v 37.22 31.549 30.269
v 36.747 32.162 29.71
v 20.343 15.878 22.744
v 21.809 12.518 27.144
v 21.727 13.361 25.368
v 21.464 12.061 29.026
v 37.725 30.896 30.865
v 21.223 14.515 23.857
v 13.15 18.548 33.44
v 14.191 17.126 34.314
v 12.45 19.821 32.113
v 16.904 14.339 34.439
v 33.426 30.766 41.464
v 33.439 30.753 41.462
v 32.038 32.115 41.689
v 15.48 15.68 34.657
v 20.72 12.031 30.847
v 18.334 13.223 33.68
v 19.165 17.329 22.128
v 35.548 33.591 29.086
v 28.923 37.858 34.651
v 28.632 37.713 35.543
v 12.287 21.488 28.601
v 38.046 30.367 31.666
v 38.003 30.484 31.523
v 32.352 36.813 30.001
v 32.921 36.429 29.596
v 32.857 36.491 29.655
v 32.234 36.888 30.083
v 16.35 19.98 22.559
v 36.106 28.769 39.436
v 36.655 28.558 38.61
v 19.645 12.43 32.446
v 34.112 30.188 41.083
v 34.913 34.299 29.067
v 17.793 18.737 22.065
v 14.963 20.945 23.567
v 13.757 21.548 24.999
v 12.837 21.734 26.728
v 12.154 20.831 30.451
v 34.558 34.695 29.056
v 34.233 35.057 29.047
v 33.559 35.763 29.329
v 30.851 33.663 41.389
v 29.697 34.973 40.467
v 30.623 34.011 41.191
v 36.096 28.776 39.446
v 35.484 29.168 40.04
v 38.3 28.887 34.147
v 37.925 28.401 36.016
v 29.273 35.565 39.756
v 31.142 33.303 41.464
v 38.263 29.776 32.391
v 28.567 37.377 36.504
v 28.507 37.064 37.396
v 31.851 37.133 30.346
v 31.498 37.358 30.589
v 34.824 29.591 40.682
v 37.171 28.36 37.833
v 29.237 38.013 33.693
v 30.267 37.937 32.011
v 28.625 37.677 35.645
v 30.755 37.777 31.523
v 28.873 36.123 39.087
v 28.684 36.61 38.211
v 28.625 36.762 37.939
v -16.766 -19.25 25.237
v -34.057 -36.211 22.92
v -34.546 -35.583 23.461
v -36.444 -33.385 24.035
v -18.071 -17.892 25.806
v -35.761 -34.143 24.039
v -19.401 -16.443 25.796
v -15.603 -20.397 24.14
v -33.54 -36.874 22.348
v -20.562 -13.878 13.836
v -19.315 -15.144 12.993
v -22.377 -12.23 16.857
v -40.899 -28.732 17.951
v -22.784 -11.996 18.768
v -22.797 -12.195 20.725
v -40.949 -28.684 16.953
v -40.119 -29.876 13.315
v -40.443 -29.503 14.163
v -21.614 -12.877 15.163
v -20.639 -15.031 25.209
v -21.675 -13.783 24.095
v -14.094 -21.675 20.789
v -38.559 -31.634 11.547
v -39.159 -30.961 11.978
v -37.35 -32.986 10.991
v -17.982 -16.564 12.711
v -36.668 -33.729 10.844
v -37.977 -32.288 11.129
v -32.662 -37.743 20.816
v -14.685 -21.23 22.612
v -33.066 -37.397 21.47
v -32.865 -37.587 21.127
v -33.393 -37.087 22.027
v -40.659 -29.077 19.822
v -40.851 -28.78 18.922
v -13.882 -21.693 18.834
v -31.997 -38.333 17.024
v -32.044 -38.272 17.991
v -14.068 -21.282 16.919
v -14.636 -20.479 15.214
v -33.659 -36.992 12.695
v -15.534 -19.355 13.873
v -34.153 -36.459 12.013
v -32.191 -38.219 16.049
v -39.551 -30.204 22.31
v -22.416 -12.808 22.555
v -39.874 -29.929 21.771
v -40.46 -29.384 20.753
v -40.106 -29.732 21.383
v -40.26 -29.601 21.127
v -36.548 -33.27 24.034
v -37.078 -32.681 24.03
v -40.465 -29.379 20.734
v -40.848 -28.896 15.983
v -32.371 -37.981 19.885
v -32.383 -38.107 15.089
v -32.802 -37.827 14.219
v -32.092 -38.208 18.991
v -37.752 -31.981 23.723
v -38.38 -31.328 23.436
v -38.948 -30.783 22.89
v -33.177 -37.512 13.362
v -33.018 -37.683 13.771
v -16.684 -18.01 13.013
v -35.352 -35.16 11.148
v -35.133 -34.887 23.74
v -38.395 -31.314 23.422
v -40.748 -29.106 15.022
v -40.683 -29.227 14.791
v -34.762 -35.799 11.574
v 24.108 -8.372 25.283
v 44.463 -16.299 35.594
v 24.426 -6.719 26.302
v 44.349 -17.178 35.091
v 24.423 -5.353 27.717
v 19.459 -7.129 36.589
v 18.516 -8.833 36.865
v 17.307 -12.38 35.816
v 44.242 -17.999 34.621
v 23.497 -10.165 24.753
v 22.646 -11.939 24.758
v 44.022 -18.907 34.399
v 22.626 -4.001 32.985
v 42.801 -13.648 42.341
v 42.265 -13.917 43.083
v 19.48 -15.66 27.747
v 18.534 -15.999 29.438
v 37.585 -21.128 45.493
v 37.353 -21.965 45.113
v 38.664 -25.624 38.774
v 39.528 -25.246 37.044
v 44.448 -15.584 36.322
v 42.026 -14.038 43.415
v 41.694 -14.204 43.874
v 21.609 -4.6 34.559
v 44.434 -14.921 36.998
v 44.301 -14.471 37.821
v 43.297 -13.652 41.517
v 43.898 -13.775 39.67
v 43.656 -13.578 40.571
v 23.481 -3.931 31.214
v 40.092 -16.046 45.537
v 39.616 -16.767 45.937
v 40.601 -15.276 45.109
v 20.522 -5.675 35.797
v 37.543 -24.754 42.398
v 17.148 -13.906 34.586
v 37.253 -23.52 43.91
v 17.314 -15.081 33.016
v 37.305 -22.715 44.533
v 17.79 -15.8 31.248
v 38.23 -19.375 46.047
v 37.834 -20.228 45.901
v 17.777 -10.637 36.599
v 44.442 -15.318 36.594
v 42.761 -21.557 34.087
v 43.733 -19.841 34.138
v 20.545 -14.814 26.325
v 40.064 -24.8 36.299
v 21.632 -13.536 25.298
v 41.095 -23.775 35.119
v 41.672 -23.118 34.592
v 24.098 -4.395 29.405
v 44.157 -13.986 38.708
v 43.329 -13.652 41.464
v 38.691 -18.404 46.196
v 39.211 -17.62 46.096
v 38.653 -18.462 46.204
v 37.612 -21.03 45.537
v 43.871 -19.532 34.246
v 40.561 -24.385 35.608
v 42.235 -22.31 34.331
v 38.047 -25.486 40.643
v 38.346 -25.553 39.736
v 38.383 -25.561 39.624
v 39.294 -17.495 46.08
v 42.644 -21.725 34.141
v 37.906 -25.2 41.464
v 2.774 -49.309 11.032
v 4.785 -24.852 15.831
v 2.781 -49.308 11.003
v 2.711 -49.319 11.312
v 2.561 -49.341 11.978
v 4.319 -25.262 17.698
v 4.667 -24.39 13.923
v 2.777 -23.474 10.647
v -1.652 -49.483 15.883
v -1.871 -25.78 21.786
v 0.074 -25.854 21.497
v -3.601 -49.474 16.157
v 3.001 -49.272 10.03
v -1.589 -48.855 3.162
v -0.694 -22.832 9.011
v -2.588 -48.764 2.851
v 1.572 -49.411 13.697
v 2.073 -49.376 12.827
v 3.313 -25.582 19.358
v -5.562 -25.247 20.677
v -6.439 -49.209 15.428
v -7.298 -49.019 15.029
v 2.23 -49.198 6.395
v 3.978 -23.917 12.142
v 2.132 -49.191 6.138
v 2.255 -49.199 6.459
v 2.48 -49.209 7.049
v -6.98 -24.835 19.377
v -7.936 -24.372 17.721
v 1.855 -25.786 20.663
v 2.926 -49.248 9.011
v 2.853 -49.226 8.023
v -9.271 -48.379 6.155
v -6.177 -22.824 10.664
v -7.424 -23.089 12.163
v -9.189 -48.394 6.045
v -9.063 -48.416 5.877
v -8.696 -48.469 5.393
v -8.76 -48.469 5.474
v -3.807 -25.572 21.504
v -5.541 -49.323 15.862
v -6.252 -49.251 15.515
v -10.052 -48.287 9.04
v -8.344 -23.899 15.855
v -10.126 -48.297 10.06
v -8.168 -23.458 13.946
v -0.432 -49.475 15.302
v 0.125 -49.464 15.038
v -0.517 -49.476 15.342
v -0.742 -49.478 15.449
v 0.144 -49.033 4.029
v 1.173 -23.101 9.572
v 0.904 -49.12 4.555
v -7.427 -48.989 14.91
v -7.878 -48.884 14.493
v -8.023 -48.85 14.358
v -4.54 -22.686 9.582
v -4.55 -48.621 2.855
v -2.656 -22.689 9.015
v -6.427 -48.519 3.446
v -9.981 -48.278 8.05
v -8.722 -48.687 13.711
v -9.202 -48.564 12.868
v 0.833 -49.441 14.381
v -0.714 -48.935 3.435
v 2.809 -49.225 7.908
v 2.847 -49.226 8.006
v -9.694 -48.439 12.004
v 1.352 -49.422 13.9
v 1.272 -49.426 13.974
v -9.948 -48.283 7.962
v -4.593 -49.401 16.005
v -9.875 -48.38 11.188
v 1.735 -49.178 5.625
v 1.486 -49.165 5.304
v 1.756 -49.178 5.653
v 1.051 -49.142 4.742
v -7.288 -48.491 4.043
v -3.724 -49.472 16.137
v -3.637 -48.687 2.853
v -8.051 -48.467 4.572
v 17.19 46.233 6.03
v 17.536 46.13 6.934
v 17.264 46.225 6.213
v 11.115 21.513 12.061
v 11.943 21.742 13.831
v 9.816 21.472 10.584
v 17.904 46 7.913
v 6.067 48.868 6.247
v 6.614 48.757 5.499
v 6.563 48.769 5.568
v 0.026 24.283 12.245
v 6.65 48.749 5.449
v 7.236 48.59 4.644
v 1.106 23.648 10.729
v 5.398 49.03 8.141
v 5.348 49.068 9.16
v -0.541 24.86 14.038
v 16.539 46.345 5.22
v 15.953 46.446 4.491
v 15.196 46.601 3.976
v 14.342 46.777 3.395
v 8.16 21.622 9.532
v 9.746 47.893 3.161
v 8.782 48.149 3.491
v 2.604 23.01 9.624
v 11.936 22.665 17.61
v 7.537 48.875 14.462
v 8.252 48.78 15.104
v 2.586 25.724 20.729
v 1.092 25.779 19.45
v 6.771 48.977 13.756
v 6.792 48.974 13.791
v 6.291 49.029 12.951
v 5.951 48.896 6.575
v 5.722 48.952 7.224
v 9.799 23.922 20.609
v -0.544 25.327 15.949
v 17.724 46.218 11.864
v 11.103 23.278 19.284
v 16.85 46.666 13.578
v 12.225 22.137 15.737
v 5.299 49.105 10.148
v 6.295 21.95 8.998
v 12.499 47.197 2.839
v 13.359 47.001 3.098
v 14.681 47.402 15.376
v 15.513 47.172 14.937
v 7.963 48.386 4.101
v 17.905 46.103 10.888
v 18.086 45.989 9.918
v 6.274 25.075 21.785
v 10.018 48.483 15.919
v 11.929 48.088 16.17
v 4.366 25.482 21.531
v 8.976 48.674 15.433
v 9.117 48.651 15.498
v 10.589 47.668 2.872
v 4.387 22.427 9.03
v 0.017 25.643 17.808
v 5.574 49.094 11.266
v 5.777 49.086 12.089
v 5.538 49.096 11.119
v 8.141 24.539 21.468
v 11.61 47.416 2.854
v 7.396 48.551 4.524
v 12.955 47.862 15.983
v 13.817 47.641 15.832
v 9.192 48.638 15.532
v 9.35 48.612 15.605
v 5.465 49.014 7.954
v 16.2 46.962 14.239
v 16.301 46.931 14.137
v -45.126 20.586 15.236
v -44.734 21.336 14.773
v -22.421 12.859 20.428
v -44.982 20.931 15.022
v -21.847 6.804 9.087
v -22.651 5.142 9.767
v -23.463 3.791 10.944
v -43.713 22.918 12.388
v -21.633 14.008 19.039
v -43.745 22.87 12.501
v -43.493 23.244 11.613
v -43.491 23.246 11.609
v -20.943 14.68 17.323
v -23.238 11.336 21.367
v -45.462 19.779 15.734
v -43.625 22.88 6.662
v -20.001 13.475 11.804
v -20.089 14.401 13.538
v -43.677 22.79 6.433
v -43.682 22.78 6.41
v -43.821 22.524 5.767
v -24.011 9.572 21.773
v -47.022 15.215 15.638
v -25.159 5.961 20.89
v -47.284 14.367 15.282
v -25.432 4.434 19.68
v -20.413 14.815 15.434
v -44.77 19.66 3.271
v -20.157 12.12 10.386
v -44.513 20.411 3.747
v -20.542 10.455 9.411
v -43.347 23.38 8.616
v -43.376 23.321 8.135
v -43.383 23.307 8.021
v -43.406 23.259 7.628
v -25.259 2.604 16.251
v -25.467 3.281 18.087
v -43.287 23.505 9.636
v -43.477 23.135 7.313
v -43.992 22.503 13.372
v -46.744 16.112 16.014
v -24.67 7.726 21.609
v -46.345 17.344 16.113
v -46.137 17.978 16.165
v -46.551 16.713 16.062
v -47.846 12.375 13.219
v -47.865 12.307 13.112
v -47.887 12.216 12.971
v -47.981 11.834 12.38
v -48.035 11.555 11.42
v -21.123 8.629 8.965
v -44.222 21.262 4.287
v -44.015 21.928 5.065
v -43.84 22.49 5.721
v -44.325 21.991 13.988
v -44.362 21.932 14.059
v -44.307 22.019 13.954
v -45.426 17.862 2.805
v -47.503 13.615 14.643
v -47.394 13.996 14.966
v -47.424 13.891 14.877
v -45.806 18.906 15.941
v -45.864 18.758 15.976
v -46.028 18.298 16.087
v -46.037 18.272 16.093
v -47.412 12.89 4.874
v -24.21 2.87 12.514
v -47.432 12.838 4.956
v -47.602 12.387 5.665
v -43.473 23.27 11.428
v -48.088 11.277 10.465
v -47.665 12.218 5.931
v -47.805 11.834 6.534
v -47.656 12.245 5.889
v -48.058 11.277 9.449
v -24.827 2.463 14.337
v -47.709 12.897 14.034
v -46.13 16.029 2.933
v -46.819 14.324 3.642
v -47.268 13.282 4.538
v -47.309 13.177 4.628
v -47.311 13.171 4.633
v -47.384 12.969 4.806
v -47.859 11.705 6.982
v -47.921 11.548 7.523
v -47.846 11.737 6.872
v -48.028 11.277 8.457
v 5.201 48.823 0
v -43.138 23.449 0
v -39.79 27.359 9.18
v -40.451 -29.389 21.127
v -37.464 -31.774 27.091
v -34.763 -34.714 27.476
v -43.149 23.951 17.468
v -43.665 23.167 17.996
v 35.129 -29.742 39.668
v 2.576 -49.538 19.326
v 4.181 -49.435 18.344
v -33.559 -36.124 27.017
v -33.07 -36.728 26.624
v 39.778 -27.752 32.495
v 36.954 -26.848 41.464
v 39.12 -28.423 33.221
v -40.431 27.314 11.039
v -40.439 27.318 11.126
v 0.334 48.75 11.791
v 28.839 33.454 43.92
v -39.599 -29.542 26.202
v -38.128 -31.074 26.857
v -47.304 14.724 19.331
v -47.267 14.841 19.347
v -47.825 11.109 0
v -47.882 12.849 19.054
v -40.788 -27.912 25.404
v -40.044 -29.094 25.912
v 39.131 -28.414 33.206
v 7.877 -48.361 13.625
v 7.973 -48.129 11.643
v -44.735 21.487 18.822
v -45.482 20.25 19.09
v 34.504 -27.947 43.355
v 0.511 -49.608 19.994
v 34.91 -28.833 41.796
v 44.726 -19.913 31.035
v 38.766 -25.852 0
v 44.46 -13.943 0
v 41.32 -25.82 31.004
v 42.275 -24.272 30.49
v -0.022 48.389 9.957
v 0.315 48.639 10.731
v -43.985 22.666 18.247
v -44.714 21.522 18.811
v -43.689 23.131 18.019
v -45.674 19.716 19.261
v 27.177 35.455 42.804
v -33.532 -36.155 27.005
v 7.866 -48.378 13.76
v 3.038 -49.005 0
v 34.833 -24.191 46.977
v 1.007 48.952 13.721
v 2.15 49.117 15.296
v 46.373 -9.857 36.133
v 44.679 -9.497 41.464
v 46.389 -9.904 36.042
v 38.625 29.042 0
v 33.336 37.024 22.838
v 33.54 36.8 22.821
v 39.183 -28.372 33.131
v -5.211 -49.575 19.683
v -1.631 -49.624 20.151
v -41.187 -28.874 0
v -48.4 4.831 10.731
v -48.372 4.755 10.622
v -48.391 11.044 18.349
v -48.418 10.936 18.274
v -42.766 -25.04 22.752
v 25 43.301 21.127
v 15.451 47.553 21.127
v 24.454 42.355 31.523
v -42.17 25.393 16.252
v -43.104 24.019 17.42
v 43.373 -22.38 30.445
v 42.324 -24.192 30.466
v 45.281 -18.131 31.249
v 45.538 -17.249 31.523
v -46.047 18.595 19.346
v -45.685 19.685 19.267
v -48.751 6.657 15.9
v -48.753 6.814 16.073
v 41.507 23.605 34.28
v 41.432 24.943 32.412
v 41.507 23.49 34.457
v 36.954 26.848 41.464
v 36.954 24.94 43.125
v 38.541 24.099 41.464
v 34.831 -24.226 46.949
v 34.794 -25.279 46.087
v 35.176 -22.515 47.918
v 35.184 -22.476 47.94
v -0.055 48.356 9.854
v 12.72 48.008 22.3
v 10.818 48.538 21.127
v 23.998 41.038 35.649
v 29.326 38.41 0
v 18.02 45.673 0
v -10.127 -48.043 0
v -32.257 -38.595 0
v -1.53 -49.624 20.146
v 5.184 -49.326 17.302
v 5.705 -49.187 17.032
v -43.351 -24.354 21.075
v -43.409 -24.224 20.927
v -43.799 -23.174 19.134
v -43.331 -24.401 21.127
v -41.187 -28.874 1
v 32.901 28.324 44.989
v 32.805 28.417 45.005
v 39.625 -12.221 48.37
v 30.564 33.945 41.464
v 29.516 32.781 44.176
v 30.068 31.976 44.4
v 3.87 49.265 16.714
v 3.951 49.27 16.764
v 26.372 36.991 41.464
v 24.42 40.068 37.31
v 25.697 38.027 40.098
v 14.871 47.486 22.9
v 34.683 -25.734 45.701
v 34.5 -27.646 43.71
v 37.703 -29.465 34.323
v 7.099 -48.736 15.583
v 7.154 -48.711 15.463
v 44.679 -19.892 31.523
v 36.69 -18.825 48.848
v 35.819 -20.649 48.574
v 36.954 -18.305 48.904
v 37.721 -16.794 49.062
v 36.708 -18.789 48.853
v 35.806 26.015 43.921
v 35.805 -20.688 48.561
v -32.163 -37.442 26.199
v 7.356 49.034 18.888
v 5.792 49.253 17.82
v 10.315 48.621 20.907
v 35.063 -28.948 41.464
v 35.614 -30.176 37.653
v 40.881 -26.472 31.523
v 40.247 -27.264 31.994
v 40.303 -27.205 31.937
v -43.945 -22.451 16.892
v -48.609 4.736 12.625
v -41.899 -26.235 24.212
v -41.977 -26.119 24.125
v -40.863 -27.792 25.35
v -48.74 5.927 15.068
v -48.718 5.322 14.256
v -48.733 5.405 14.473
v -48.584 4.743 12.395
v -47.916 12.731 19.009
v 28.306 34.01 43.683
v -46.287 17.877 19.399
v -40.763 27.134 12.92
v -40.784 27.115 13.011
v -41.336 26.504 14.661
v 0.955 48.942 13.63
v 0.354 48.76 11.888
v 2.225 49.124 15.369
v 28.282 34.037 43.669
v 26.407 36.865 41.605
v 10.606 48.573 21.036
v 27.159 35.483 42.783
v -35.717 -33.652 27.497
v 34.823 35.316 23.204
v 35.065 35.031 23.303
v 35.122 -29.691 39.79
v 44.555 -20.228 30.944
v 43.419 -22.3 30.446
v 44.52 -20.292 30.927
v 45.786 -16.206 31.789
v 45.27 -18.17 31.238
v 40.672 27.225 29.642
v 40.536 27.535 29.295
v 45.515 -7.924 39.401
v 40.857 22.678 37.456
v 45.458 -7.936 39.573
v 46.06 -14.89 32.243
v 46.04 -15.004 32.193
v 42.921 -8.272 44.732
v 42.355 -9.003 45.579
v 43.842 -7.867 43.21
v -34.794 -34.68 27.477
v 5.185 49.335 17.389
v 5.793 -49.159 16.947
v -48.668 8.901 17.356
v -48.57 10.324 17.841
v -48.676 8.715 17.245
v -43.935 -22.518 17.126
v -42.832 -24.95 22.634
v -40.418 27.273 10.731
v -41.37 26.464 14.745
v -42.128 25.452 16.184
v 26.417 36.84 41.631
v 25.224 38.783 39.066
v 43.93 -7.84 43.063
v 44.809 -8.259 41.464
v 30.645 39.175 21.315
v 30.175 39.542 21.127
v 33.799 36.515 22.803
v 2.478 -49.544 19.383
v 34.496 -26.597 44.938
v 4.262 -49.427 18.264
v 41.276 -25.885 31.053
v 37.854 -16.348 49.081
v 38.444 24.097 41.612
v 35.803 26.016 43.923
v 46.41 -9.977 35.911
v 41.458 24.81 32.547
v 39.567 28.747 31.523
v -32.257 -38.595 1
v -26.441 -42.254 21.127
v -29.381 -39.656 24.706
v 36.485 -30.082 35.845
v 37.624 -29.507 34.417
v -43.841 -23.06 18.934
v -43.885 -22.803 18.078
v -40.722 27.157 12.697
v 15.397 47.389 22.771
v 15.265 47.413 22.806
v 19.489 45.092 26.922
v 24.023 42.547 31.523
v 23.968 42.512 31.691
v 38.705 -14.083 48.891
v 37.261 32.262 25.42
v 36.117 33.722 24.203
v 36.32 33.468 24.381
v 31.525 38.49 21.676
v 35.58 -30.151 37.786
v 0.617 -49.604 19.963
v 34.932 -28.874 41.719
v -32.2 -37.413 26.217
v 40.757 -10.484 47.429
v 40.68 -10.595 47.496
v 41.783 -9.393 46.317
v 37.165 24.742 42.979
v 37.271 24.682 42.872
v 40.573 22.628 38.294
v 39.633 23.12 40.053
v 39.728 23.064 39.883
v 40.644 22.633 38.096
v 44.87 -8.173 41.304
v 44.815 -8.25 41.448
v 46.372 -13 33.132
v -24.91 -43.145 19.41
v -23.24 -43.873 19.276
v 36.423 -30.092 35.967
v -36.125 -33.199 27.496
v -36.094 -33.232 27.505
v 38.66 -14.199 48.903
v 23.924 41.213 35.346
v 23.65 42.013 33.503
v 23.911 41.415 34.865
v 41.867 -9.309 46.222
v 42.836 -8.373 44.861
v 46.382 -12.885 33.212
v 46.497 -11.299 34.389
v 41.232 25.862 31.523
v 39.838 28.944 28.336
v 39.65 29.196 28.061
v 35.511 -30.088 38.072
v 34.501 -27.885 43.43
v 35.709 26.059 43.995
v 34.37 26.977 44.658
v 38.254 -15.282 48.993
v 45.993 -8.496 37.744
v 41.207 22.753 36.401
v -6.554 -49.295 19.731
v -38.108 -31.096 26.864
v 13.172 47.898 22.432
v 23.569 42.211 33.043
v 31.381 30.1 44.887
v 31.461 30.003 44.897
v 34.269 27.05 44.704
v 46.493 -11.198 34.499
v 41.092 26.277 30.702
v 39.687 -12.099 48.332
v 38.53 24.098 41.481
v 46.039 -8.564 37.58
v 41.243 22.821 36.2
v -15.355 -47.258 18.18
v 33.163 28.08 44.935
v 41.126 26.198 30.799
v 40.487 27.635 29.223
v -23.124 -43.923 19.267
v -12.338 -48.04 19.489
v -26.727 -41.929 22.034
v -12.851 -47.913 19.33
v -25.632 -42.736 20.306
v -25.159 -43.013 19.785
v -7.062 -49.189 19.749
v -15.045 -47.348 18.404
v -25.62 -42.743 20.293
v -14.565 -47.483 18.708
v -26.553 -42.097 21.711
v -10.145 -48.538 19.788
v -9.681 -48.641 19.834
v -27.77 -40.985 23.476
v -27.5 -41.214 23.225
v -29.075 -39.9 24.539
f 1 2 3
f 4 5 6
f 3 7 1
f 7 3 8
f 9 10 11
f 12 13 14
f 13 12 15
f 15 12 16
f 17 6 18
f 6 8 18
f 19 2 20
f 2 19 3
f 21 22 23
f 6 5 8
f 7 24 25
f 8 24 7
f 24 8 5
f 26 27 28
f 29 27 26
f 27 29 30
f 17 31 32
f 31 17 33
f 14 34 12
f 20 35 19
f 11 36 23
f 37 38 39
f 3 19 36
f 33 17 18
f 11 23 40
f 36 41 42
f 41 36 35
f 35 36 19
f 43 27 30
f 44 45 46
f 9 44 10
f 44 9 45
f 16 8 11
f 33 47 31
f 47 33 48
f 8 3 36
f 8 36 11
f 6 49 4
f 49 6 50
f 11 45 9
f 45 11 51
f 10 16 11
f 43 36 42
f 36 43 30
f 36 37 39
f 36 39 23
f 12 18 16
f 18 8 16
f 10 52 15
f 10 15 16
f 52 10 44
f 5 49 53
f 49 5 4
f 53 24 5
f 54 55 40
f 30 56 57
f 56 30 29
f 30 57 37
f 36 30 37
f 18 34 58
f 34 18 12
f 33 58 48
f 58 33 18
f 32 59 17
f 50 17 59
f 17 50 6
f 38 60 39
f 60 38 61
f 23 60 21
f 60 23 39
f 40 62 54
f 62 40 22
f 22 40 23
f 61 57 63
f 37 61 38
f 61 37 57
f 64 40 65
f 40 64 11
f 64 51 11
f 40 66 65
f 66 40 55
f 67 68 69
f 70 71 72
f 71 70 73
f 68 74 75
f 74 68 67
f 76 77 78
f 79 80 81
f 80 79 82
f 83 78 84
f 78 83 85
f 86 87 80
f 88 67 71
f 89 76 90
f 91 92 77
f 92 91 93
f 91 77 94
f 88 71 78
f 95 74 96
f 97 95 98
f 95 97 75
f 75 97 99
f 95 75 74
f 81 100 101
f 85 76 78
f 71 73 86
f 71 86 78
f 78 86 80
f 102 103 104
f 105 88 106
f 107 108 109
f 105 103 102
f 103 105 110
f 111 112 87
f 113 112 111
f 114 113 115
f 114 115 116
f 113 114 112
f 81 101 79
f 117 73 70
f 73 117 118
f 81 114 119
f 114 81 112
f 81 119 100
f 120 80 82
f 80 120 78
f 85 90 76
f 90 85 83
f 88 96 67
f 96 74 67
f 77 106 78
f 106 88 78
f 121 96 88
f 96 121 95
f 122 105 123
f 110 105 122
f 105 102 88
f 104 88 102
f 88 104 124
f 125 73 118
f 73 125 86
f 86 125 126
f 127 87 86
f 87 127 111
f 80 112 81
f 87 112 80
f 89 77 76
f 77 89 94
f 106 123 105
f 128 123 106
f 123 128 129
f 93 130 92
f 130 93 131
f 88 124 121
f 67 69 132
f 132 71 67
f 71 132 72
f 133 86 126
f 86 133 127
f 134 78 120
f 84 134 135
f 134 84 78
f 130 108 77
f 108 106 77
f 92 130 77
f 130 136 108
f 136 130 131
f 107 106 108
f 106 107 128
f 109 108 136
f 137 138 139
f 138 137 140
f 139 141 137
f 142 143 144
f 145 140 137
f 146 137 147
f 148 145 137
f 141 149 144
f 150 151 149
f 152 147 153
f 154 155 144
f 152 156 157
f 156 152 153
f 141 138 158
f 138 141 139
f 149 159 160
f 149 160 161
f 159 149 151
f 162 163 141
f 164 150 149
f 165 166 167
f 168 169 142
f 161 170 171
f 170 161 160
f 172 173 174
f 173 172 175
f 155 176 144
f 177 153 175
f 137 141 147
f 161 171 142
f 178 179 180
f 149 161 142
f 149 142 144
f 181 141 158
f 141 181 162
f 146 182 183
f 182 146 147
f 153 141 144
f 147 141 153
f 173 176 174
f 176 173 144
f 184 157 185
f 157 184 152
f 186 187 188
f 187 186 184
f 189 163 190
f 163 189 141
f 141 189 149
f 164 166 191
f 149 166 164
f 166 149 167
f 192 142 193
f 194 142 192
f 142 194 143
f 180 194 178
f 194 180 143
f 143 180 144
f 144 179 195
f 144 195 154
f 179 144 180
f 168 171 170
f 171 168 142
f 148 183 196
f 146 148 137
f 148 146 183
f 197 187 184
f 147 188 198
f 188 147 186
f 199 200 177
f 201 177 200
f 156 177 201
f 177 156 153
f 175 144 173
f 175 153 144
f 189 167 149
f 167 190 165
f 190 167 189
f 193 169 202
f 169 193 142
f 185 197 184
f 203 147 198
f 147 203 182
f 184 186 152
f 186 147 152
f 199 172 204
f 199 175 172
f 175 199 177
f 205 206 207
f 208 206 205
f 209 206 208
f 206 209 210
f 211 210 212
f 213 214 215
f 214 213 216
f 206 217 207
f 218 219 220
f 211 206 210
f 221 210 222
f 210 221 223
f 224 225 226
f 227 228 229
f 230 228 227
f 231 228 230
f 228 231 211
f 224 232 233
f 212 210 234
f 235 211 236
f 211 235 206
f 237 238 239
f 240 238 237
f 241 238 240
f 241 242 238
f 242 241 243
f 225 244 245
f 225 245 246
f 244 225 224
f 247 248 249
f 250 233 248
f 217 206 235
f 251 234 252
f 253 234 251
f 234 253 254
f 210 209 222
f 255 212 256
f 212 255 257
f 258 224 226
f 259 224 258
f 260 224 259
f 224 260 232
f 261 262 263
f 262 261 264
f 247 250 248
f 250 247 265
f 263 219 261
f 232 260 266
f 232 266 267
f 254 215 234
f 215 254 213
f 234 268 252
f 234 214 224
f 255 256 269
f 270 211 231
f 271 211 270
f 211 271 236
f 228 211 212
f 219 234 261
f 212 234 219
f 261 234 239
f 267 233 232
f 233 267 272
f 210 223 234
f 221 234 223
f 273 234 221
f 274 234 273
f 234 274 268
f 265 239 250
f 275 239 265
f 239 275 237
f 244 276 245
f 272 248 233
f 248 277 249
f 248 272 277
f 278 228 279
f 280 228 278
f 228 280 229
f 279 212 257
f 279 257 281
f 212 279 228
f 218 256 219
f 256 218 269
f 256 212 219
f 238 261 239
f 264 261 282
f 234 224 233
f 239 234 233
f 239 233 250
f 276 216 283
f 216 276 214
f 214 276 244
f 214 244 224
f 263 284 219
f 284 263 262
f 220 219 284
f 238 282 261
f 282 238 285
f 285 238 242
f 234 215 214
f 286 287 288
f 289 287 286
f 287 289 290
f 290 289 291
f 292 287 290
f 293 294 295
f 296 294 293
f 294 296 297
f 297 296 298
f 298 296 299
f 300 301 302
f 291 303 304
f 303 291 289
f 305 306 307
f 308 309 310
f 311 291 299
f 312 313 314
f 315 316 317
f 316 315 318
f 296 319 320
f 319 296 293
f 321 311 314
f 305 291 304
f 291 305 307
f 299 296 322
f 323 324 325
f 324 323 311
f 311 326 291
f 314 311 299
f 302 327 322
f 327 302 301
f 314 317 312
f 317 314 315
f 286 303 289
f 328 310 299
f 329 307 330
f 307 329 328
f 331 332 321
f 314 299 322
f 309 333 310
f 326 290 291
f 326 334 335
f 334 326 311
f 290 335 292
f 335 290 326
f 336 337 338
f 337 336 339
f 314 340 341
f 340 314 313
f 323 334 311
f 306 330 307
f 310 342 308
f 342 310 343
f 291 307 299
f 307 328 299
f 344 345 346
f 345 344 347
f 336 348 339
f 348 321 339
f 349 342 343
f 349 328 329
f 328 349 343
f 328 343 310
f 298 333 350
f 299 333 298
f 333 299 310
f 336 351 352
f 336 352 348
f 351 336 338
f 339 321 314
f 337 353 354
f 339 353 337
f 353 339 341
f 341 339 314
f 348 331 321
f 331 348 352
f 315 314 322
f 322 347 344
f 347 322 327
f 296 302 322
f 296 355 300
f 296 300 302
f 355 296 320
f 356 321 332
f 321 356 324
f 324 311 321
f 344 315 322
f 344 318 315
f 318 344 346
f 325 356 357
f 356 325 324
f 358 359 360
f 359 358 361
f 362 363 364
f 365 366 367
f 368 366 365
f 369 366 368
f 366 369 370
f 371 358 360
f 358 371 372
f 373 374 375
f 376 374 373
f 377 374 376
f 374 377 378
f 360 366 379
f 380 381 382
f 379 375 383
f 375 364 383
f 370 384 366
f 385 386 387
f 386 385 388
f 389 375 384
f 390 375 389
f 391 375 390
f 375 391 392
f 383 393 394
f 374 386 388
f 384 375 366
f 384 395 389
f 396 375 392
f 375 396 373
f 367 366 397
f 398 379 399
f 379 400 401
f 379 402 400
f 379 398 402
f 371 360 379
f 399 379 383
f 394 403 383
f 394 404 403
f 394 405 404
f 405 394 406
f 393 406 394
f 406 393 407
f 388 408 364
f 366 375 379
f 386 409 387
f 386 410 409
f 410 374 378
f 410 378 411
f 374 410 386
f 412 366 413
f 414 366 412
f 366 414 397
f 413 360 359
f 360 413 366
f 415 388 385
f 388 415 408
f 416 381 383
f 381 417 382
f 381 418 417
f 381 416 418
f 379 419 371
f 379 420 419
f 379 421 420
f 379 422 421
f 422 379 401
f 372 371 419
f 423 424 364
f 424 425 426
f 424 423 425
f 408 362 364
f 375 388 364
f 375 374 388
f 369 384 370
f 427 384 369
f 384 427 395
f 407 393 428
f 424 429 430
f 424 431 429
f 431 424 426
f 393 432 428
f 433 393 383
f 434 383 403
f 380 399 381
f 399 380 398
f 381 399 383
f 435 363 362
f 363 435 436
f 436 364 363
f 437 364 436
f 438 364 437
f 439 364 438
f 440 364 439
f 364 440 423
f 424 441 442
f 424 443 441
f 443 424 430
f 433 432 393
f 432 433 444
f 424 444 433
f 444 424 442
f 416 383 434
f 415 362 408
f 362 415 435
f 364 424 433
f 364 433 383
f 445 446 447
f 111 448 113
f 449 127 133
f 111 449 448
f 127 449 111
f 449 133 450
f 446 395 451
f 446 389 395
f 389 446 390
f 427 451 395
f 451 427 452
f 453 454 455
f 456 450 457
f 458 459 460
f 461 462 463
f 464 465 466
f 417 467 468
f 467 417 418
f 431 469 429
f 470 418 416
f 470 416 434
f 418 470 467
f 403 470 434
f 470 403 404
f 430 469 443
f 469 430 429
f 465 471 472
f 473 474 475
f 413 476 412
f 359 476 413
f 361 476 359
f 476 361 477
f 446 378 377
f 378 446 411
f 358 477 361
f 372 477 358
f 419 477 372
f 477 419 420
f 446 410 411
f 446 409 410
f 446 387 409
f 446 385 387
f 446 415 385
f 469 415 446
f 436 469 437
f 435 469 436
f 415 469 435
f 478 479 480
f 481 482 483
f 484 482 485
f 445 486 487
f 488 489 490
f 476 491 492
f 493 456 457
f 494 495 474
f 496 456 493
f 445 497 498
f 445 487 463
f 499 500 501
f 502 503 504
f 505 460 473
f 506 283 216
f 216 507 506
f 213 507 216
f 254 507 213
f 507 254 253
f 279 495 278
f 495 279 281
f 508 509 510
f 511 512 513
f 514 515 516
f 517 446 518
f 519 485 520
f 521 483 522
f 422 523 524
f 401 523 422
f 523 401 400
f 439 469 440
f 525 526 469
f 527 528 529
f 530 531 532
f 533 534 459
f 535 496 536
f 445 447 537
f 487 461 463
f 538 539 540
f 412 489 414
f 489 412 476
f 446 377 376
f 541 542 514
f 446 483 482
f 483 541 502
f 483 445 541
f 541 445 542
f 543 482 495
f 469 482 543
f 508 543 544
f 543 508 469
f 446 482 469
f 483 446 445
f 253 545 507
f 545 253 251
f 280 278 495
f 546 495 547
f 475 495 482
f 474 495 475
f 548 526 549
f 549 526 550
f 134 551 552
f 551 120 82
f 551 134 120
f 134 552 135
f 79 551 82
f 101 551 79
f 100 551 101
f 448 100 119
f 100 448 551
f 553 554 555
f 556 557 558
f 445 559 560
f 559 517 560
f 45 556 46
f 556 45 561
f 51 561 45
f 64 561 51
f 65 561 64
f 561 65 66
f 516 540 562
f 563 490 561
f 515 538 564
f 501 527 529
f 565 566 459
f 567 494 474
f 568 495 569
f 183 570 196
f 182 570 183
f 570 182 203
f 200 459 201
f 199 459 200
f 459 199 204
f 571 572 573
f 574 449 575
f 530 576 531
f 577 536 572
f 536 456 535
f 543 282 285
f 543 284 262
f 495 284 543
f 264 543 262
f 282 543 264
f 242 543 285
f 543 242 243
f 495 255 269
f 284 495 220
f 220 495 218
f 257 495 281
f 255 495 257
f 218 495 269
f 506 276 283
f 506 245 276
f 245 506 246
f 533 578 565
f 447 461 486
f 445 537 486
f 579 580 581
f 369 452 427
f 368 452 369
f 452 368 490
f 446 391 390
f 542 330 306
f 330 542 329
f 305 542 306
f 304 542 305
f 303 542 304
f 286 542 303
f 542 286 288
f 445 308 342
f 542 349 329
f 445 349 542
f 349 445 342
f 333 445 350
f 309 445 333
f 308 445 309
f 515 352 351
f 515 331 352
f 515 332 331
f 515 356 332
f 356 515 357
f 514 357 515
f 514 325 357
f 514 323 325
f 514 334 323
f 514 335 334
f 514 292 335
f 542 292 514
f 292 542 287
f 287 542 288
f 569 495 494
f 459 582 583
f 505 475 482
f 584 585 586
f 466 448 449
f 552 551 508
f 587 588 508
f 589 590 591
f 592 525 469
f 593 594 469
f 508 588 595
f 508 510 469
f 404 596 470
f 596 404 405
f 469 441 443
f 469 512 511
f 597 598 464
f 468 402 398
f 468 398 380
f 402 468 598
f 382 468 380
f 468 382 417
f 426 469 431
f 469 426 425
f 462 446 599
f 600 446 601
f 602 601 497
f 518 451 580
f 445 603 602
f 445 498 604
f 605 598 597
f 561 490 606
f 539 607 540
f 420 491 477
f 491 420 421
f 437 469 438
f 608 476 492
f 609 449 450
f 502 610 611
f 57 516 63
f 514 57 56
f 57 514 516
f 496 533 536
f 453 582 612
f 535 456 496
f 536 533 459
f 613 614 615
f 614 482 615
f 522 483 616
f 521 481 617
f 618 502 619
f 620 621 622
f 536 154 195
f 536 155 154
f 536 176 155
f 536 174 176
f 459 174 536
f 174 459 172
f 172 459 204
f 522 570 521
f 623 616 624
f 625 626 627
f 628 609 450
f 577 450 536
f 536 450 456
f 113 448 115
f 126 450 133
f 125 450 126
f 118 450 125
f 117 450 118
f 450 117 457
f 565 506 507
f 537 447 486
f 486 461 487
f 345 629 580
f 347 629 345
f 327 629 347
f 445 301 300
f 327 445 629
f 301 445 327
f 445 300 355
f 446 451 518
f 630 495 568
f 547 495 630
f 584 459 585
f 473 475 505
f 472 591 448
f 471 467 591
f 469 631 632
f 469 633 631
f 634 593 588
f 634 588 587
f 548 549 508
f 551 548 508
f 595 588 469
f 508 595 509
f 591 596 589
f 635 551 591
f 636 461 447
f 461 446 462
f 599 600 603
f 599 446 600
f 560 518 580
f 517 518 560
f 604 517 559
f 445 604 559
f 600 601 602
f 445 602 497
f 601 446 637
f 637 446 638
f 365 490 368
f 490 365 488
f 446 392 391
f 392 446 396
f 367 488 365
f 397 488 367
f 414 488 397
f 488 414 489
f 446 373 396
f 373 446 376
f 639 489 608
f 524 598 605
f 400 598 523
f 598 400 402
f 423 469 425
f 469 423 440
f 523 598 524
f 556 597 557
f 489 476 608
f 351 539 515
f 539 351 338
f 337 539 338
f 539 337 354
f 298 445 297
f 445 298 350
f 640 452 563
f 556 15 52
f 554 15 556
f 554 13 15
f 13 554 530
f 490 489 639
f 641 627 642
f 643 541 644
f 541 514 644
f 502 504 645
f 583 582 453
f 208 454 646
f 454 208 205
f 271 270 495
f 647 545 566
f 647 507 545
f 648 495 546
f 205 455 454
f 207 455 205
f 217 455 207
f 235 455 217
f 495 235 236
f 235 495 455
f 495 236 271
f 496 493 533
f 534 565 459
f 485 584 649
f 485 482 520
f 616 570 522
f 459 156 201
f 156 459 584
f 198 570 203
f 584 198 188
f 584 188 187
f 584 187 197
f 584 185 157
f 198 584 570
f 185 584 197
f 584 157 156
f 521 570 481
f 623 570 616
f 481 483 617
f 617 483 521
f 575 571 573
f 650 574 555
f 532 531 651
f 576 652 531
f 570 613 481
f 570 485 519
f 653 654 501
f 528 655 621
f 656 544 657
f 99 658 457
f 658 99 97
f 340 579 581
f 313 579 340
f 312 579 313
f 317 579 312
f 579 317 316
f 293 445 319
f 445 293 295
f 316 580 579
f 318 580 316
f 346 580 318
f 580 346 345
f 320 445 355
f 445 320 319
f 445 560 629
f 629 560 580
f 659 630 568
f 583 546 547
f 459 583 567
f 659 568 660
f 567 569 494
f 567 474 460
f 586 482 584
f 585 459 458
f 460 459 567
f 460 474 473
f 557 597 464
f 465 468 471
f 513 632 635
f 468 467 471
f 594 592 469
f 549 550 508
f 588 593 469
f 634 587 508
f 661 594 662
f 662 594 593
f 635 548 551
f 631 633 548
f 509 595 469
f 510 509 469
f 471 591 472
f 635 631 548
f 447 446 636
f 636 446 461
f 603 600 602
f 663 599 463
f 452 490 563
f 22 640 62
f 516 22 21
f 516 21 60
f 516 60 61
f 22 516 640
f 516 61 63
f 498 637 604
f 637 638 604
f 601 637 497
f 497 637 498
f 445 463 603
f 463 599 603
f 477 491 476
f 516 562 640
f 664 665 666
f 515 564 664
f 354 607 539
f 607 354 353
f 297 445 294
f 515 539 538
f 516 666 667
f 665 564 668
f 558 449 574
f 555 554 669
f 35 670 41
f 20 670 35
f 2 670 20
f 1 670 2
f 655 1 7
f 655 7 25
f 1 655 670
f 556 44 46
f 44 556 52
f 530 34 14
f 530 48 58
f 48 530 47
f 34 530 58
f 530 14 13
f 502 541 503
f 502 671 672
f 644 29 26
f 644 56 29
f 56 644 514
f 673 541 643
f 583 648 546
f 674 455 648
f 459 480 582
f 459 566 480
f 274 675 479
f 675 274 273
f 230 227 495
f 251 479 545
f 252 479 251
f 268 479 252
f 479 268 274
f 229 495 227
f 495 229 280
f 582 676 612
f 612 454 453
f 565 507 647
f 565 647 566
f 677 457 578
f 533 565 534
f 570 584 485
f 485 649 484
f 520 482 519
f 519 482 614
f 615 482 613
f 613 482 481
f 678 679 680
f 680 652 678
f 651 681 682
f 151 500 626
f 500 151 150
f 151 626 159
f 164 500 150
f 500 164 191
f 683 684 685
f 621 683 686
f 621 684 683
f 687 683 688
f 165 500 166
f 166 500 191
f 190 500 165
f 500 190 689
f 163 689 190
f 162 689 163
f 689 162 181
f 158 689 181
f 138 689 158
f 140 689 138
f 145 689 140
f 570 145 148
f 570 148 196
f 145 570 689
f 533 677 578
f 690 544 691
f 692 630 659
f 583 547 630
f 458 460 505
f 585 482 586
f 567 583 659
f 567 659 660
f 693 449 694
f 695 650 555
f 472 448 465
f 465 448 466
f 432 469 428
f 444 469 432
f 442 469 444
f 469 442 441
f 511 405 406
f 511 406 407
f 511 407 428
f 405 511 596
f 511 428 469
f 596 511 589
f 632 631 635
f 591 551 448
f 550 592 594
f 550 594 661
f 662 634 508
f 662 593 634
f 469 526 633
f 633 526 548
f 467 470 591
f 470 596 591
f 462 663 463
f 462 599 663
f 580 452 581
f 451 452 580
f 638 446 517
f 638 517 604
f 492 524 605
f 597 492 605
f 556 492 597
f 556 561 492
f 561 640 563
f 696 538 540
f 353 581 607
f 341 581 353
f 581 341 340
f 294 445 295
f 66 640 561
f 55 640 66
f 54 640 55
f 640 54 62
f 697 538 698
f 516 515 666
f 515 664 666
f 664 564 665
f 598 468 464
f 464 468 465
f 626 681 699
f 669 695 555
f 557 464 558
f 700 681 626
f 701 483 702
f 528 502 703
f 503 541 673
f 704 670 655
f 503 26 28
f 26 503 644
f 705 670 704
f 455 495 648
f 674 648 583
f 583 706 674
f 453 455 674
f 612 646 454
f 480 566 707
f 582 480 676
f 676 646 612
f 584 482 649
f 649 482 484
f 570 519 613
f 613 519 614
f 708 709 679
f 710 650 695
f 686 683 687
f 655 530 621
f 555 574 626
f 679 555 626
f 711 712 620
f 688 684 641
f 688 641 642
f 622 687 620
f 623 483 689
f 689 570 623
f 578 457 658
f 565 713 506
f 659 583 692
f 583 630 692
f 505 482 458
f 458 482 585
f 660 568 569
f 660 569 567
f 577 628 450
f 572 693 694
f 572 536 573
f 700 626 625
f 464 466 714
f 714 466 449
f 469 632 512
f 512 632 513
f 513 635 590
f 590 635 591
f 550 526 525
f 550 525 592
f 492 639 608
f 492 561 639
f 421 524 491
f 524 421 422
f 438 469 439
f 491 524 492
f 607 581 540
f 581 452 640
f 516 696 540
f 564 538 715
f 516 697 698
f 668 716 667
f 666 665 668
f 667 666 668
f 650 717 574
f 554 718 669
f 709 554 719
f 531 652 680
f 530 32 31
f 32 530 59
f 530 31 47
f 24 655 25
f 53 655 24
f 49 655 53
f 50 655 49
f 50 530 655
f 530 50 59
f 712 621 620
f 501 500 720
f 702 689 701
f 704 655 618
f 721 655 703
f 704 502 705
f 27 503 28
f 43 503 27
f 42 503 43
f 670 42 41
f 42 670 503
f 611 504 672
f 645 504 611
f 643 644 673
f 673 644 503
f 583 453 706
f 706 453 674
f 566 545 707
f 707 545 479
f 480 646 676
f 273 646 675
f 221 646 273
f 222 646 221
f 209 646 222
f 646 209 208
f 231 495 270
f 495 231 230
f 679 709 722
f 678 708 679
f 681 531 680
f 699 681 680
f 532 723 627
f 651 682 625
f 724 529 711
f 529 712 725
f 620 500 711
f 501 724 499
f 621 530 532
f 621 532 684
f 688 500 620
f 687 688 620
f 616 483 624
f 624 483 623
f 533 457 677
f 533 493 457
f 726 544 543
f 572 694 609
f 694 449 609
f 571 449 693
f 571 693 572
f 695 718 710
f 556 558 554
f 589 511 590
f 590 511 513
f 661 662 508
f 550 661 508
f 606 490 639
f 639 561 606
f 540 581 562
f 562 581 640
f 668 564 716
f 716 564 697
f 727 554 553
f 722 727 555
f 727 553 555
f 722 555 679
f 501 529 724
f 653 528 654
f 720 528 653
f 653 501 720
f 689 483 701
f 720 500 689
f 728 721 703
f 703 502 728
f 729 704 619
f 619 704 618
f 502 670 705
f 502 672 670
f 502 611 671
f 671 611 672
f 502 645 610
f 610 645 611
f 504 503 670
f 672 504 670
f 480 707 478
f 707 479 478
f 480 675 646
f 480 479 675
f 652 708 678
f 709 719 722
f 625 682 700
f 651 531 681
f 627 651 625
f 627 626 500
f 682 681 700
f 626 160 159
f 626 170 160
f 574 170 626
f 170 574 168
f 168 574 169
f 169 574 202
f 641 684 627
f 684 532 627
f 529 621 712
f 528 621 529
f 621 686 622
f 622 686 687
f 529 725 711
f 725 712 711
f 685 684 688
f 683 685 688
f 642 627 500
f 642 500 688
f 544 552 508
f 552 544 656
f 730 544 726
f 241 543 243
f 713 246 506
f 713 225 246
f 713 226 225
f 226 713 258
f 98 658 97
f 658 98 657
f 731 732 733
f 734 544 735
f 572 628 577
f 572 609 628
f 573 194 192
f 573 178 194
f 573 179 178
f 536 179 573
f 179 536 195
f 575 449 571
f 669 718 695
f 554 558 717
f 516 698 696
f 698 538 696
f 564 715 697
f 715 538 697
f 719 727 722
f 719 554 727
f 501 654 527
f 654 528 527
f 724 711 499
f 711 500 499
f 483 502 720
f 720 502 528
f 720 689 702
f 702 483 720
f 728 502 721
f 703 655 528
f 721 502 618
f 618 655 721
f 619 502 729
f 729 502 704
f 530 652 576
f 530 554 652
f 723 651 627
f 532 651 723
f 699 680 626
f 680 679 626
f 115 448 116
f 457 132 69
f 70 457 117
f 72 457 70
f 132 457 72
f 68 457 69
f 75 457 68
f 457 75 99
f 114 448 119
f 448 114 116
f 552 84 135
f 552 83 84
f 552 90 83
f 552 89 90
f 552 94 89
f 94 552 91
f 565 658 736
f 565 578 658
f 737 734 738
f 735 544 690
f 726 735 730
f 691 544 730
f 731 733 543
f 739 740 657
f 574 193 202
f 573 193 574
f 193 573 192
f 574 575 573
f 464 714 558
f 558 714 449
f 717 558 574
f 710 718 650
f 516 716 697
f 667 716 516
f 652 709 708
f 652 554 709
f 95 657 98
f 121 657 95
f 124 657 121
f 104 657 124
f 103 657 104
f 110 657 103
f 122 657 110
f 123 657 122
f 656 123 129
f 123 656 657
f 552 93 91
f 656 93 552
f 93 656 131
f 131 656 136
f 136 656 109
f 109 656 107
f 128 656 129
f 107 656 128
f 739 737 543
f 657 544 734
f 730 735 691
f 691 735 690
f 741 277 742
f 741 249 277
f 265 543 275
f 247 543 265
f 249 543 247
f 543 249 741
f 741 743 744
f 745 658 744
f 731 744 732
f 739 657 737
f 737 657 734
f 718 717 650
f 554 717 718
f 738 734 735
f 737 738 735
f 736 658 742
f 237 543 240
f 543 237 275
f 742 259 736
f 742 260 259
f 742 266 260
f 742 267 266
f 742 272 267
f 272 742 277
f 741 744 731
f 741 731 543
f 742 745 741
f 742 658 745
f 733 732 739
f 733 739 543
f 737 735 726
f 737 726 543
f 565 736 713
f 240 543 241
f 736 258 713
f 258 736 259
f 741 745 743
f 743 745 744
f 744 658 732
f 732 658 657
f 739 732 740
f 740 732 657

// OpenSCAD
difference() {
	hull() {
		union() {
			union() {
				rotate(a = 44.7886434991, v = [0, 0, 1]) {
					translate(v = [0, -6.6000000000, 0]) {
						cube(size = [47.8728205650, 13.2000000000, 1]);
					}
				}
				rotate(a = -137.4284145433, v = [0, 0, 1]) {
					translate(v = [0, -6.6000000000, 0]) {
						cube(size = [49.8652399807, 13.2000000000, 1]);
					}
				}
				rotate(a = -25.5551377076, v = [0, 0, 1]) {
					translate(v = [0, -6.6000000000, 0]) {
						cube(size = [46.1254874485, 13.2000000000, 1]);
					}
				}
				rotate(a = -94.1777278702, v = [0, 0, 1]) {
					translate(v = [0, -6.6000000000, 0]) {
						cube(size = [48.6531349253, 13.2000000000, 1]);
					}
				}
				rotate(a = 76.1941204399, v = [0, 0, 1]) {
					translate(v = [0, -6.6000000000, 0]) {
						cube(size = [48.6531375534, 13.2000000000, 1]);
					}
				}
				rotate(a = 159.1977941195, v = [0, 0, 1]) {
					translate(v = [0, -6.6000000000, 0]) {
						cube(size = [48.6531354907, 13.2000000000, 1]);
					}
				}
			}
			translate(v = [0, 0, 21.1269677277]) {
				intersection() {
					hull() {
						rotate(a = 73.2270811909, v = [-0.6745215807, 0.6795164716, -0.0000000050]) {
							cylinder(h = 50, r = 9.6000000000);
						}
						rotate(a = 94.2076451547, v = [0.6746874302, -0.7344477709, 0.0000000598]) {
							cylinder(h = 50, r = 9.6000000000);
						}
						rotate(a = 67.2957656601, v = [0.3979521676, 0.8322607608, -0.0000012302]) {
							cylinder(h = 50, r = 9.6000000000);
						}
						rotate(a = 103.3289646367, v = [0.9704769150, -0.0708878867, -0.0000008996]) {
							cylinder(h = 50, r = 9.6000000000);
						}
						rotate(a = 103.3288209429, v = [-0.9449510012, 0.2322052229, 0.0000007127]) {
							cylinder(h = 50, r = 9.6000000000);
						}
						rotate(a = 103.3289337213, v = [-0.3455765946, -0.9096304714, 0.0000012552]) {
							cylinder(h = 50, r = 9.6000000000);
						}
					}
					sphere(r = 50);
				}
			}
		}
	}
	translate(v = [0, 0, 21.1269677277]) {
		rotate(a = 73.2270811909, v = [-0.6745215807, 0.6795164716, -0.0000000050]) {
			translate(v = [0, 0, 25]) {
				cylinder(h = 50, r = 6.6000000000);
			}
		}
		rotate(a = 94.2076451547, v = [0.6746874302, -0.7344477709, 0.0000000598]) {
			translate(v = [0, 0, 25]) {
				cylinder(h = 50, r = 6.6000000000);
			}
		}
		rotate(a = 67.2957656601, v = [0.3979521676, 0.8322607608, -0.0000012302]) {
			translate(v = [0, 0, 25]) {
				cylinder(h = 50, r = 6.6000000000);
			}
		}
		rotate(a = 103.3289646367, v = [0.9704769150, -0.0708878867, -0.0000008996]) {
			translate(v = [0, 0, 25]) {
				cylinder(h = 50, r = 6.6000000000);
			}
		}
		rotate(a = 103.3288209429, v = [-0.9449510012, 0.2322052229, 0.0000007127]) {
			translate(v = [0, 0, 25]) {
				cylinder(h = 50, r = 6.6000000000);
			}
		}
		rotate(a = 103.3289337213, v = [-0.3455765946, -0.9096304714, 0.0000012552]) {
			translate(v = [0, 0, 25]) {
				cylinder(h = 50, r = 6.6000000000);
			}
		}
	}
}
